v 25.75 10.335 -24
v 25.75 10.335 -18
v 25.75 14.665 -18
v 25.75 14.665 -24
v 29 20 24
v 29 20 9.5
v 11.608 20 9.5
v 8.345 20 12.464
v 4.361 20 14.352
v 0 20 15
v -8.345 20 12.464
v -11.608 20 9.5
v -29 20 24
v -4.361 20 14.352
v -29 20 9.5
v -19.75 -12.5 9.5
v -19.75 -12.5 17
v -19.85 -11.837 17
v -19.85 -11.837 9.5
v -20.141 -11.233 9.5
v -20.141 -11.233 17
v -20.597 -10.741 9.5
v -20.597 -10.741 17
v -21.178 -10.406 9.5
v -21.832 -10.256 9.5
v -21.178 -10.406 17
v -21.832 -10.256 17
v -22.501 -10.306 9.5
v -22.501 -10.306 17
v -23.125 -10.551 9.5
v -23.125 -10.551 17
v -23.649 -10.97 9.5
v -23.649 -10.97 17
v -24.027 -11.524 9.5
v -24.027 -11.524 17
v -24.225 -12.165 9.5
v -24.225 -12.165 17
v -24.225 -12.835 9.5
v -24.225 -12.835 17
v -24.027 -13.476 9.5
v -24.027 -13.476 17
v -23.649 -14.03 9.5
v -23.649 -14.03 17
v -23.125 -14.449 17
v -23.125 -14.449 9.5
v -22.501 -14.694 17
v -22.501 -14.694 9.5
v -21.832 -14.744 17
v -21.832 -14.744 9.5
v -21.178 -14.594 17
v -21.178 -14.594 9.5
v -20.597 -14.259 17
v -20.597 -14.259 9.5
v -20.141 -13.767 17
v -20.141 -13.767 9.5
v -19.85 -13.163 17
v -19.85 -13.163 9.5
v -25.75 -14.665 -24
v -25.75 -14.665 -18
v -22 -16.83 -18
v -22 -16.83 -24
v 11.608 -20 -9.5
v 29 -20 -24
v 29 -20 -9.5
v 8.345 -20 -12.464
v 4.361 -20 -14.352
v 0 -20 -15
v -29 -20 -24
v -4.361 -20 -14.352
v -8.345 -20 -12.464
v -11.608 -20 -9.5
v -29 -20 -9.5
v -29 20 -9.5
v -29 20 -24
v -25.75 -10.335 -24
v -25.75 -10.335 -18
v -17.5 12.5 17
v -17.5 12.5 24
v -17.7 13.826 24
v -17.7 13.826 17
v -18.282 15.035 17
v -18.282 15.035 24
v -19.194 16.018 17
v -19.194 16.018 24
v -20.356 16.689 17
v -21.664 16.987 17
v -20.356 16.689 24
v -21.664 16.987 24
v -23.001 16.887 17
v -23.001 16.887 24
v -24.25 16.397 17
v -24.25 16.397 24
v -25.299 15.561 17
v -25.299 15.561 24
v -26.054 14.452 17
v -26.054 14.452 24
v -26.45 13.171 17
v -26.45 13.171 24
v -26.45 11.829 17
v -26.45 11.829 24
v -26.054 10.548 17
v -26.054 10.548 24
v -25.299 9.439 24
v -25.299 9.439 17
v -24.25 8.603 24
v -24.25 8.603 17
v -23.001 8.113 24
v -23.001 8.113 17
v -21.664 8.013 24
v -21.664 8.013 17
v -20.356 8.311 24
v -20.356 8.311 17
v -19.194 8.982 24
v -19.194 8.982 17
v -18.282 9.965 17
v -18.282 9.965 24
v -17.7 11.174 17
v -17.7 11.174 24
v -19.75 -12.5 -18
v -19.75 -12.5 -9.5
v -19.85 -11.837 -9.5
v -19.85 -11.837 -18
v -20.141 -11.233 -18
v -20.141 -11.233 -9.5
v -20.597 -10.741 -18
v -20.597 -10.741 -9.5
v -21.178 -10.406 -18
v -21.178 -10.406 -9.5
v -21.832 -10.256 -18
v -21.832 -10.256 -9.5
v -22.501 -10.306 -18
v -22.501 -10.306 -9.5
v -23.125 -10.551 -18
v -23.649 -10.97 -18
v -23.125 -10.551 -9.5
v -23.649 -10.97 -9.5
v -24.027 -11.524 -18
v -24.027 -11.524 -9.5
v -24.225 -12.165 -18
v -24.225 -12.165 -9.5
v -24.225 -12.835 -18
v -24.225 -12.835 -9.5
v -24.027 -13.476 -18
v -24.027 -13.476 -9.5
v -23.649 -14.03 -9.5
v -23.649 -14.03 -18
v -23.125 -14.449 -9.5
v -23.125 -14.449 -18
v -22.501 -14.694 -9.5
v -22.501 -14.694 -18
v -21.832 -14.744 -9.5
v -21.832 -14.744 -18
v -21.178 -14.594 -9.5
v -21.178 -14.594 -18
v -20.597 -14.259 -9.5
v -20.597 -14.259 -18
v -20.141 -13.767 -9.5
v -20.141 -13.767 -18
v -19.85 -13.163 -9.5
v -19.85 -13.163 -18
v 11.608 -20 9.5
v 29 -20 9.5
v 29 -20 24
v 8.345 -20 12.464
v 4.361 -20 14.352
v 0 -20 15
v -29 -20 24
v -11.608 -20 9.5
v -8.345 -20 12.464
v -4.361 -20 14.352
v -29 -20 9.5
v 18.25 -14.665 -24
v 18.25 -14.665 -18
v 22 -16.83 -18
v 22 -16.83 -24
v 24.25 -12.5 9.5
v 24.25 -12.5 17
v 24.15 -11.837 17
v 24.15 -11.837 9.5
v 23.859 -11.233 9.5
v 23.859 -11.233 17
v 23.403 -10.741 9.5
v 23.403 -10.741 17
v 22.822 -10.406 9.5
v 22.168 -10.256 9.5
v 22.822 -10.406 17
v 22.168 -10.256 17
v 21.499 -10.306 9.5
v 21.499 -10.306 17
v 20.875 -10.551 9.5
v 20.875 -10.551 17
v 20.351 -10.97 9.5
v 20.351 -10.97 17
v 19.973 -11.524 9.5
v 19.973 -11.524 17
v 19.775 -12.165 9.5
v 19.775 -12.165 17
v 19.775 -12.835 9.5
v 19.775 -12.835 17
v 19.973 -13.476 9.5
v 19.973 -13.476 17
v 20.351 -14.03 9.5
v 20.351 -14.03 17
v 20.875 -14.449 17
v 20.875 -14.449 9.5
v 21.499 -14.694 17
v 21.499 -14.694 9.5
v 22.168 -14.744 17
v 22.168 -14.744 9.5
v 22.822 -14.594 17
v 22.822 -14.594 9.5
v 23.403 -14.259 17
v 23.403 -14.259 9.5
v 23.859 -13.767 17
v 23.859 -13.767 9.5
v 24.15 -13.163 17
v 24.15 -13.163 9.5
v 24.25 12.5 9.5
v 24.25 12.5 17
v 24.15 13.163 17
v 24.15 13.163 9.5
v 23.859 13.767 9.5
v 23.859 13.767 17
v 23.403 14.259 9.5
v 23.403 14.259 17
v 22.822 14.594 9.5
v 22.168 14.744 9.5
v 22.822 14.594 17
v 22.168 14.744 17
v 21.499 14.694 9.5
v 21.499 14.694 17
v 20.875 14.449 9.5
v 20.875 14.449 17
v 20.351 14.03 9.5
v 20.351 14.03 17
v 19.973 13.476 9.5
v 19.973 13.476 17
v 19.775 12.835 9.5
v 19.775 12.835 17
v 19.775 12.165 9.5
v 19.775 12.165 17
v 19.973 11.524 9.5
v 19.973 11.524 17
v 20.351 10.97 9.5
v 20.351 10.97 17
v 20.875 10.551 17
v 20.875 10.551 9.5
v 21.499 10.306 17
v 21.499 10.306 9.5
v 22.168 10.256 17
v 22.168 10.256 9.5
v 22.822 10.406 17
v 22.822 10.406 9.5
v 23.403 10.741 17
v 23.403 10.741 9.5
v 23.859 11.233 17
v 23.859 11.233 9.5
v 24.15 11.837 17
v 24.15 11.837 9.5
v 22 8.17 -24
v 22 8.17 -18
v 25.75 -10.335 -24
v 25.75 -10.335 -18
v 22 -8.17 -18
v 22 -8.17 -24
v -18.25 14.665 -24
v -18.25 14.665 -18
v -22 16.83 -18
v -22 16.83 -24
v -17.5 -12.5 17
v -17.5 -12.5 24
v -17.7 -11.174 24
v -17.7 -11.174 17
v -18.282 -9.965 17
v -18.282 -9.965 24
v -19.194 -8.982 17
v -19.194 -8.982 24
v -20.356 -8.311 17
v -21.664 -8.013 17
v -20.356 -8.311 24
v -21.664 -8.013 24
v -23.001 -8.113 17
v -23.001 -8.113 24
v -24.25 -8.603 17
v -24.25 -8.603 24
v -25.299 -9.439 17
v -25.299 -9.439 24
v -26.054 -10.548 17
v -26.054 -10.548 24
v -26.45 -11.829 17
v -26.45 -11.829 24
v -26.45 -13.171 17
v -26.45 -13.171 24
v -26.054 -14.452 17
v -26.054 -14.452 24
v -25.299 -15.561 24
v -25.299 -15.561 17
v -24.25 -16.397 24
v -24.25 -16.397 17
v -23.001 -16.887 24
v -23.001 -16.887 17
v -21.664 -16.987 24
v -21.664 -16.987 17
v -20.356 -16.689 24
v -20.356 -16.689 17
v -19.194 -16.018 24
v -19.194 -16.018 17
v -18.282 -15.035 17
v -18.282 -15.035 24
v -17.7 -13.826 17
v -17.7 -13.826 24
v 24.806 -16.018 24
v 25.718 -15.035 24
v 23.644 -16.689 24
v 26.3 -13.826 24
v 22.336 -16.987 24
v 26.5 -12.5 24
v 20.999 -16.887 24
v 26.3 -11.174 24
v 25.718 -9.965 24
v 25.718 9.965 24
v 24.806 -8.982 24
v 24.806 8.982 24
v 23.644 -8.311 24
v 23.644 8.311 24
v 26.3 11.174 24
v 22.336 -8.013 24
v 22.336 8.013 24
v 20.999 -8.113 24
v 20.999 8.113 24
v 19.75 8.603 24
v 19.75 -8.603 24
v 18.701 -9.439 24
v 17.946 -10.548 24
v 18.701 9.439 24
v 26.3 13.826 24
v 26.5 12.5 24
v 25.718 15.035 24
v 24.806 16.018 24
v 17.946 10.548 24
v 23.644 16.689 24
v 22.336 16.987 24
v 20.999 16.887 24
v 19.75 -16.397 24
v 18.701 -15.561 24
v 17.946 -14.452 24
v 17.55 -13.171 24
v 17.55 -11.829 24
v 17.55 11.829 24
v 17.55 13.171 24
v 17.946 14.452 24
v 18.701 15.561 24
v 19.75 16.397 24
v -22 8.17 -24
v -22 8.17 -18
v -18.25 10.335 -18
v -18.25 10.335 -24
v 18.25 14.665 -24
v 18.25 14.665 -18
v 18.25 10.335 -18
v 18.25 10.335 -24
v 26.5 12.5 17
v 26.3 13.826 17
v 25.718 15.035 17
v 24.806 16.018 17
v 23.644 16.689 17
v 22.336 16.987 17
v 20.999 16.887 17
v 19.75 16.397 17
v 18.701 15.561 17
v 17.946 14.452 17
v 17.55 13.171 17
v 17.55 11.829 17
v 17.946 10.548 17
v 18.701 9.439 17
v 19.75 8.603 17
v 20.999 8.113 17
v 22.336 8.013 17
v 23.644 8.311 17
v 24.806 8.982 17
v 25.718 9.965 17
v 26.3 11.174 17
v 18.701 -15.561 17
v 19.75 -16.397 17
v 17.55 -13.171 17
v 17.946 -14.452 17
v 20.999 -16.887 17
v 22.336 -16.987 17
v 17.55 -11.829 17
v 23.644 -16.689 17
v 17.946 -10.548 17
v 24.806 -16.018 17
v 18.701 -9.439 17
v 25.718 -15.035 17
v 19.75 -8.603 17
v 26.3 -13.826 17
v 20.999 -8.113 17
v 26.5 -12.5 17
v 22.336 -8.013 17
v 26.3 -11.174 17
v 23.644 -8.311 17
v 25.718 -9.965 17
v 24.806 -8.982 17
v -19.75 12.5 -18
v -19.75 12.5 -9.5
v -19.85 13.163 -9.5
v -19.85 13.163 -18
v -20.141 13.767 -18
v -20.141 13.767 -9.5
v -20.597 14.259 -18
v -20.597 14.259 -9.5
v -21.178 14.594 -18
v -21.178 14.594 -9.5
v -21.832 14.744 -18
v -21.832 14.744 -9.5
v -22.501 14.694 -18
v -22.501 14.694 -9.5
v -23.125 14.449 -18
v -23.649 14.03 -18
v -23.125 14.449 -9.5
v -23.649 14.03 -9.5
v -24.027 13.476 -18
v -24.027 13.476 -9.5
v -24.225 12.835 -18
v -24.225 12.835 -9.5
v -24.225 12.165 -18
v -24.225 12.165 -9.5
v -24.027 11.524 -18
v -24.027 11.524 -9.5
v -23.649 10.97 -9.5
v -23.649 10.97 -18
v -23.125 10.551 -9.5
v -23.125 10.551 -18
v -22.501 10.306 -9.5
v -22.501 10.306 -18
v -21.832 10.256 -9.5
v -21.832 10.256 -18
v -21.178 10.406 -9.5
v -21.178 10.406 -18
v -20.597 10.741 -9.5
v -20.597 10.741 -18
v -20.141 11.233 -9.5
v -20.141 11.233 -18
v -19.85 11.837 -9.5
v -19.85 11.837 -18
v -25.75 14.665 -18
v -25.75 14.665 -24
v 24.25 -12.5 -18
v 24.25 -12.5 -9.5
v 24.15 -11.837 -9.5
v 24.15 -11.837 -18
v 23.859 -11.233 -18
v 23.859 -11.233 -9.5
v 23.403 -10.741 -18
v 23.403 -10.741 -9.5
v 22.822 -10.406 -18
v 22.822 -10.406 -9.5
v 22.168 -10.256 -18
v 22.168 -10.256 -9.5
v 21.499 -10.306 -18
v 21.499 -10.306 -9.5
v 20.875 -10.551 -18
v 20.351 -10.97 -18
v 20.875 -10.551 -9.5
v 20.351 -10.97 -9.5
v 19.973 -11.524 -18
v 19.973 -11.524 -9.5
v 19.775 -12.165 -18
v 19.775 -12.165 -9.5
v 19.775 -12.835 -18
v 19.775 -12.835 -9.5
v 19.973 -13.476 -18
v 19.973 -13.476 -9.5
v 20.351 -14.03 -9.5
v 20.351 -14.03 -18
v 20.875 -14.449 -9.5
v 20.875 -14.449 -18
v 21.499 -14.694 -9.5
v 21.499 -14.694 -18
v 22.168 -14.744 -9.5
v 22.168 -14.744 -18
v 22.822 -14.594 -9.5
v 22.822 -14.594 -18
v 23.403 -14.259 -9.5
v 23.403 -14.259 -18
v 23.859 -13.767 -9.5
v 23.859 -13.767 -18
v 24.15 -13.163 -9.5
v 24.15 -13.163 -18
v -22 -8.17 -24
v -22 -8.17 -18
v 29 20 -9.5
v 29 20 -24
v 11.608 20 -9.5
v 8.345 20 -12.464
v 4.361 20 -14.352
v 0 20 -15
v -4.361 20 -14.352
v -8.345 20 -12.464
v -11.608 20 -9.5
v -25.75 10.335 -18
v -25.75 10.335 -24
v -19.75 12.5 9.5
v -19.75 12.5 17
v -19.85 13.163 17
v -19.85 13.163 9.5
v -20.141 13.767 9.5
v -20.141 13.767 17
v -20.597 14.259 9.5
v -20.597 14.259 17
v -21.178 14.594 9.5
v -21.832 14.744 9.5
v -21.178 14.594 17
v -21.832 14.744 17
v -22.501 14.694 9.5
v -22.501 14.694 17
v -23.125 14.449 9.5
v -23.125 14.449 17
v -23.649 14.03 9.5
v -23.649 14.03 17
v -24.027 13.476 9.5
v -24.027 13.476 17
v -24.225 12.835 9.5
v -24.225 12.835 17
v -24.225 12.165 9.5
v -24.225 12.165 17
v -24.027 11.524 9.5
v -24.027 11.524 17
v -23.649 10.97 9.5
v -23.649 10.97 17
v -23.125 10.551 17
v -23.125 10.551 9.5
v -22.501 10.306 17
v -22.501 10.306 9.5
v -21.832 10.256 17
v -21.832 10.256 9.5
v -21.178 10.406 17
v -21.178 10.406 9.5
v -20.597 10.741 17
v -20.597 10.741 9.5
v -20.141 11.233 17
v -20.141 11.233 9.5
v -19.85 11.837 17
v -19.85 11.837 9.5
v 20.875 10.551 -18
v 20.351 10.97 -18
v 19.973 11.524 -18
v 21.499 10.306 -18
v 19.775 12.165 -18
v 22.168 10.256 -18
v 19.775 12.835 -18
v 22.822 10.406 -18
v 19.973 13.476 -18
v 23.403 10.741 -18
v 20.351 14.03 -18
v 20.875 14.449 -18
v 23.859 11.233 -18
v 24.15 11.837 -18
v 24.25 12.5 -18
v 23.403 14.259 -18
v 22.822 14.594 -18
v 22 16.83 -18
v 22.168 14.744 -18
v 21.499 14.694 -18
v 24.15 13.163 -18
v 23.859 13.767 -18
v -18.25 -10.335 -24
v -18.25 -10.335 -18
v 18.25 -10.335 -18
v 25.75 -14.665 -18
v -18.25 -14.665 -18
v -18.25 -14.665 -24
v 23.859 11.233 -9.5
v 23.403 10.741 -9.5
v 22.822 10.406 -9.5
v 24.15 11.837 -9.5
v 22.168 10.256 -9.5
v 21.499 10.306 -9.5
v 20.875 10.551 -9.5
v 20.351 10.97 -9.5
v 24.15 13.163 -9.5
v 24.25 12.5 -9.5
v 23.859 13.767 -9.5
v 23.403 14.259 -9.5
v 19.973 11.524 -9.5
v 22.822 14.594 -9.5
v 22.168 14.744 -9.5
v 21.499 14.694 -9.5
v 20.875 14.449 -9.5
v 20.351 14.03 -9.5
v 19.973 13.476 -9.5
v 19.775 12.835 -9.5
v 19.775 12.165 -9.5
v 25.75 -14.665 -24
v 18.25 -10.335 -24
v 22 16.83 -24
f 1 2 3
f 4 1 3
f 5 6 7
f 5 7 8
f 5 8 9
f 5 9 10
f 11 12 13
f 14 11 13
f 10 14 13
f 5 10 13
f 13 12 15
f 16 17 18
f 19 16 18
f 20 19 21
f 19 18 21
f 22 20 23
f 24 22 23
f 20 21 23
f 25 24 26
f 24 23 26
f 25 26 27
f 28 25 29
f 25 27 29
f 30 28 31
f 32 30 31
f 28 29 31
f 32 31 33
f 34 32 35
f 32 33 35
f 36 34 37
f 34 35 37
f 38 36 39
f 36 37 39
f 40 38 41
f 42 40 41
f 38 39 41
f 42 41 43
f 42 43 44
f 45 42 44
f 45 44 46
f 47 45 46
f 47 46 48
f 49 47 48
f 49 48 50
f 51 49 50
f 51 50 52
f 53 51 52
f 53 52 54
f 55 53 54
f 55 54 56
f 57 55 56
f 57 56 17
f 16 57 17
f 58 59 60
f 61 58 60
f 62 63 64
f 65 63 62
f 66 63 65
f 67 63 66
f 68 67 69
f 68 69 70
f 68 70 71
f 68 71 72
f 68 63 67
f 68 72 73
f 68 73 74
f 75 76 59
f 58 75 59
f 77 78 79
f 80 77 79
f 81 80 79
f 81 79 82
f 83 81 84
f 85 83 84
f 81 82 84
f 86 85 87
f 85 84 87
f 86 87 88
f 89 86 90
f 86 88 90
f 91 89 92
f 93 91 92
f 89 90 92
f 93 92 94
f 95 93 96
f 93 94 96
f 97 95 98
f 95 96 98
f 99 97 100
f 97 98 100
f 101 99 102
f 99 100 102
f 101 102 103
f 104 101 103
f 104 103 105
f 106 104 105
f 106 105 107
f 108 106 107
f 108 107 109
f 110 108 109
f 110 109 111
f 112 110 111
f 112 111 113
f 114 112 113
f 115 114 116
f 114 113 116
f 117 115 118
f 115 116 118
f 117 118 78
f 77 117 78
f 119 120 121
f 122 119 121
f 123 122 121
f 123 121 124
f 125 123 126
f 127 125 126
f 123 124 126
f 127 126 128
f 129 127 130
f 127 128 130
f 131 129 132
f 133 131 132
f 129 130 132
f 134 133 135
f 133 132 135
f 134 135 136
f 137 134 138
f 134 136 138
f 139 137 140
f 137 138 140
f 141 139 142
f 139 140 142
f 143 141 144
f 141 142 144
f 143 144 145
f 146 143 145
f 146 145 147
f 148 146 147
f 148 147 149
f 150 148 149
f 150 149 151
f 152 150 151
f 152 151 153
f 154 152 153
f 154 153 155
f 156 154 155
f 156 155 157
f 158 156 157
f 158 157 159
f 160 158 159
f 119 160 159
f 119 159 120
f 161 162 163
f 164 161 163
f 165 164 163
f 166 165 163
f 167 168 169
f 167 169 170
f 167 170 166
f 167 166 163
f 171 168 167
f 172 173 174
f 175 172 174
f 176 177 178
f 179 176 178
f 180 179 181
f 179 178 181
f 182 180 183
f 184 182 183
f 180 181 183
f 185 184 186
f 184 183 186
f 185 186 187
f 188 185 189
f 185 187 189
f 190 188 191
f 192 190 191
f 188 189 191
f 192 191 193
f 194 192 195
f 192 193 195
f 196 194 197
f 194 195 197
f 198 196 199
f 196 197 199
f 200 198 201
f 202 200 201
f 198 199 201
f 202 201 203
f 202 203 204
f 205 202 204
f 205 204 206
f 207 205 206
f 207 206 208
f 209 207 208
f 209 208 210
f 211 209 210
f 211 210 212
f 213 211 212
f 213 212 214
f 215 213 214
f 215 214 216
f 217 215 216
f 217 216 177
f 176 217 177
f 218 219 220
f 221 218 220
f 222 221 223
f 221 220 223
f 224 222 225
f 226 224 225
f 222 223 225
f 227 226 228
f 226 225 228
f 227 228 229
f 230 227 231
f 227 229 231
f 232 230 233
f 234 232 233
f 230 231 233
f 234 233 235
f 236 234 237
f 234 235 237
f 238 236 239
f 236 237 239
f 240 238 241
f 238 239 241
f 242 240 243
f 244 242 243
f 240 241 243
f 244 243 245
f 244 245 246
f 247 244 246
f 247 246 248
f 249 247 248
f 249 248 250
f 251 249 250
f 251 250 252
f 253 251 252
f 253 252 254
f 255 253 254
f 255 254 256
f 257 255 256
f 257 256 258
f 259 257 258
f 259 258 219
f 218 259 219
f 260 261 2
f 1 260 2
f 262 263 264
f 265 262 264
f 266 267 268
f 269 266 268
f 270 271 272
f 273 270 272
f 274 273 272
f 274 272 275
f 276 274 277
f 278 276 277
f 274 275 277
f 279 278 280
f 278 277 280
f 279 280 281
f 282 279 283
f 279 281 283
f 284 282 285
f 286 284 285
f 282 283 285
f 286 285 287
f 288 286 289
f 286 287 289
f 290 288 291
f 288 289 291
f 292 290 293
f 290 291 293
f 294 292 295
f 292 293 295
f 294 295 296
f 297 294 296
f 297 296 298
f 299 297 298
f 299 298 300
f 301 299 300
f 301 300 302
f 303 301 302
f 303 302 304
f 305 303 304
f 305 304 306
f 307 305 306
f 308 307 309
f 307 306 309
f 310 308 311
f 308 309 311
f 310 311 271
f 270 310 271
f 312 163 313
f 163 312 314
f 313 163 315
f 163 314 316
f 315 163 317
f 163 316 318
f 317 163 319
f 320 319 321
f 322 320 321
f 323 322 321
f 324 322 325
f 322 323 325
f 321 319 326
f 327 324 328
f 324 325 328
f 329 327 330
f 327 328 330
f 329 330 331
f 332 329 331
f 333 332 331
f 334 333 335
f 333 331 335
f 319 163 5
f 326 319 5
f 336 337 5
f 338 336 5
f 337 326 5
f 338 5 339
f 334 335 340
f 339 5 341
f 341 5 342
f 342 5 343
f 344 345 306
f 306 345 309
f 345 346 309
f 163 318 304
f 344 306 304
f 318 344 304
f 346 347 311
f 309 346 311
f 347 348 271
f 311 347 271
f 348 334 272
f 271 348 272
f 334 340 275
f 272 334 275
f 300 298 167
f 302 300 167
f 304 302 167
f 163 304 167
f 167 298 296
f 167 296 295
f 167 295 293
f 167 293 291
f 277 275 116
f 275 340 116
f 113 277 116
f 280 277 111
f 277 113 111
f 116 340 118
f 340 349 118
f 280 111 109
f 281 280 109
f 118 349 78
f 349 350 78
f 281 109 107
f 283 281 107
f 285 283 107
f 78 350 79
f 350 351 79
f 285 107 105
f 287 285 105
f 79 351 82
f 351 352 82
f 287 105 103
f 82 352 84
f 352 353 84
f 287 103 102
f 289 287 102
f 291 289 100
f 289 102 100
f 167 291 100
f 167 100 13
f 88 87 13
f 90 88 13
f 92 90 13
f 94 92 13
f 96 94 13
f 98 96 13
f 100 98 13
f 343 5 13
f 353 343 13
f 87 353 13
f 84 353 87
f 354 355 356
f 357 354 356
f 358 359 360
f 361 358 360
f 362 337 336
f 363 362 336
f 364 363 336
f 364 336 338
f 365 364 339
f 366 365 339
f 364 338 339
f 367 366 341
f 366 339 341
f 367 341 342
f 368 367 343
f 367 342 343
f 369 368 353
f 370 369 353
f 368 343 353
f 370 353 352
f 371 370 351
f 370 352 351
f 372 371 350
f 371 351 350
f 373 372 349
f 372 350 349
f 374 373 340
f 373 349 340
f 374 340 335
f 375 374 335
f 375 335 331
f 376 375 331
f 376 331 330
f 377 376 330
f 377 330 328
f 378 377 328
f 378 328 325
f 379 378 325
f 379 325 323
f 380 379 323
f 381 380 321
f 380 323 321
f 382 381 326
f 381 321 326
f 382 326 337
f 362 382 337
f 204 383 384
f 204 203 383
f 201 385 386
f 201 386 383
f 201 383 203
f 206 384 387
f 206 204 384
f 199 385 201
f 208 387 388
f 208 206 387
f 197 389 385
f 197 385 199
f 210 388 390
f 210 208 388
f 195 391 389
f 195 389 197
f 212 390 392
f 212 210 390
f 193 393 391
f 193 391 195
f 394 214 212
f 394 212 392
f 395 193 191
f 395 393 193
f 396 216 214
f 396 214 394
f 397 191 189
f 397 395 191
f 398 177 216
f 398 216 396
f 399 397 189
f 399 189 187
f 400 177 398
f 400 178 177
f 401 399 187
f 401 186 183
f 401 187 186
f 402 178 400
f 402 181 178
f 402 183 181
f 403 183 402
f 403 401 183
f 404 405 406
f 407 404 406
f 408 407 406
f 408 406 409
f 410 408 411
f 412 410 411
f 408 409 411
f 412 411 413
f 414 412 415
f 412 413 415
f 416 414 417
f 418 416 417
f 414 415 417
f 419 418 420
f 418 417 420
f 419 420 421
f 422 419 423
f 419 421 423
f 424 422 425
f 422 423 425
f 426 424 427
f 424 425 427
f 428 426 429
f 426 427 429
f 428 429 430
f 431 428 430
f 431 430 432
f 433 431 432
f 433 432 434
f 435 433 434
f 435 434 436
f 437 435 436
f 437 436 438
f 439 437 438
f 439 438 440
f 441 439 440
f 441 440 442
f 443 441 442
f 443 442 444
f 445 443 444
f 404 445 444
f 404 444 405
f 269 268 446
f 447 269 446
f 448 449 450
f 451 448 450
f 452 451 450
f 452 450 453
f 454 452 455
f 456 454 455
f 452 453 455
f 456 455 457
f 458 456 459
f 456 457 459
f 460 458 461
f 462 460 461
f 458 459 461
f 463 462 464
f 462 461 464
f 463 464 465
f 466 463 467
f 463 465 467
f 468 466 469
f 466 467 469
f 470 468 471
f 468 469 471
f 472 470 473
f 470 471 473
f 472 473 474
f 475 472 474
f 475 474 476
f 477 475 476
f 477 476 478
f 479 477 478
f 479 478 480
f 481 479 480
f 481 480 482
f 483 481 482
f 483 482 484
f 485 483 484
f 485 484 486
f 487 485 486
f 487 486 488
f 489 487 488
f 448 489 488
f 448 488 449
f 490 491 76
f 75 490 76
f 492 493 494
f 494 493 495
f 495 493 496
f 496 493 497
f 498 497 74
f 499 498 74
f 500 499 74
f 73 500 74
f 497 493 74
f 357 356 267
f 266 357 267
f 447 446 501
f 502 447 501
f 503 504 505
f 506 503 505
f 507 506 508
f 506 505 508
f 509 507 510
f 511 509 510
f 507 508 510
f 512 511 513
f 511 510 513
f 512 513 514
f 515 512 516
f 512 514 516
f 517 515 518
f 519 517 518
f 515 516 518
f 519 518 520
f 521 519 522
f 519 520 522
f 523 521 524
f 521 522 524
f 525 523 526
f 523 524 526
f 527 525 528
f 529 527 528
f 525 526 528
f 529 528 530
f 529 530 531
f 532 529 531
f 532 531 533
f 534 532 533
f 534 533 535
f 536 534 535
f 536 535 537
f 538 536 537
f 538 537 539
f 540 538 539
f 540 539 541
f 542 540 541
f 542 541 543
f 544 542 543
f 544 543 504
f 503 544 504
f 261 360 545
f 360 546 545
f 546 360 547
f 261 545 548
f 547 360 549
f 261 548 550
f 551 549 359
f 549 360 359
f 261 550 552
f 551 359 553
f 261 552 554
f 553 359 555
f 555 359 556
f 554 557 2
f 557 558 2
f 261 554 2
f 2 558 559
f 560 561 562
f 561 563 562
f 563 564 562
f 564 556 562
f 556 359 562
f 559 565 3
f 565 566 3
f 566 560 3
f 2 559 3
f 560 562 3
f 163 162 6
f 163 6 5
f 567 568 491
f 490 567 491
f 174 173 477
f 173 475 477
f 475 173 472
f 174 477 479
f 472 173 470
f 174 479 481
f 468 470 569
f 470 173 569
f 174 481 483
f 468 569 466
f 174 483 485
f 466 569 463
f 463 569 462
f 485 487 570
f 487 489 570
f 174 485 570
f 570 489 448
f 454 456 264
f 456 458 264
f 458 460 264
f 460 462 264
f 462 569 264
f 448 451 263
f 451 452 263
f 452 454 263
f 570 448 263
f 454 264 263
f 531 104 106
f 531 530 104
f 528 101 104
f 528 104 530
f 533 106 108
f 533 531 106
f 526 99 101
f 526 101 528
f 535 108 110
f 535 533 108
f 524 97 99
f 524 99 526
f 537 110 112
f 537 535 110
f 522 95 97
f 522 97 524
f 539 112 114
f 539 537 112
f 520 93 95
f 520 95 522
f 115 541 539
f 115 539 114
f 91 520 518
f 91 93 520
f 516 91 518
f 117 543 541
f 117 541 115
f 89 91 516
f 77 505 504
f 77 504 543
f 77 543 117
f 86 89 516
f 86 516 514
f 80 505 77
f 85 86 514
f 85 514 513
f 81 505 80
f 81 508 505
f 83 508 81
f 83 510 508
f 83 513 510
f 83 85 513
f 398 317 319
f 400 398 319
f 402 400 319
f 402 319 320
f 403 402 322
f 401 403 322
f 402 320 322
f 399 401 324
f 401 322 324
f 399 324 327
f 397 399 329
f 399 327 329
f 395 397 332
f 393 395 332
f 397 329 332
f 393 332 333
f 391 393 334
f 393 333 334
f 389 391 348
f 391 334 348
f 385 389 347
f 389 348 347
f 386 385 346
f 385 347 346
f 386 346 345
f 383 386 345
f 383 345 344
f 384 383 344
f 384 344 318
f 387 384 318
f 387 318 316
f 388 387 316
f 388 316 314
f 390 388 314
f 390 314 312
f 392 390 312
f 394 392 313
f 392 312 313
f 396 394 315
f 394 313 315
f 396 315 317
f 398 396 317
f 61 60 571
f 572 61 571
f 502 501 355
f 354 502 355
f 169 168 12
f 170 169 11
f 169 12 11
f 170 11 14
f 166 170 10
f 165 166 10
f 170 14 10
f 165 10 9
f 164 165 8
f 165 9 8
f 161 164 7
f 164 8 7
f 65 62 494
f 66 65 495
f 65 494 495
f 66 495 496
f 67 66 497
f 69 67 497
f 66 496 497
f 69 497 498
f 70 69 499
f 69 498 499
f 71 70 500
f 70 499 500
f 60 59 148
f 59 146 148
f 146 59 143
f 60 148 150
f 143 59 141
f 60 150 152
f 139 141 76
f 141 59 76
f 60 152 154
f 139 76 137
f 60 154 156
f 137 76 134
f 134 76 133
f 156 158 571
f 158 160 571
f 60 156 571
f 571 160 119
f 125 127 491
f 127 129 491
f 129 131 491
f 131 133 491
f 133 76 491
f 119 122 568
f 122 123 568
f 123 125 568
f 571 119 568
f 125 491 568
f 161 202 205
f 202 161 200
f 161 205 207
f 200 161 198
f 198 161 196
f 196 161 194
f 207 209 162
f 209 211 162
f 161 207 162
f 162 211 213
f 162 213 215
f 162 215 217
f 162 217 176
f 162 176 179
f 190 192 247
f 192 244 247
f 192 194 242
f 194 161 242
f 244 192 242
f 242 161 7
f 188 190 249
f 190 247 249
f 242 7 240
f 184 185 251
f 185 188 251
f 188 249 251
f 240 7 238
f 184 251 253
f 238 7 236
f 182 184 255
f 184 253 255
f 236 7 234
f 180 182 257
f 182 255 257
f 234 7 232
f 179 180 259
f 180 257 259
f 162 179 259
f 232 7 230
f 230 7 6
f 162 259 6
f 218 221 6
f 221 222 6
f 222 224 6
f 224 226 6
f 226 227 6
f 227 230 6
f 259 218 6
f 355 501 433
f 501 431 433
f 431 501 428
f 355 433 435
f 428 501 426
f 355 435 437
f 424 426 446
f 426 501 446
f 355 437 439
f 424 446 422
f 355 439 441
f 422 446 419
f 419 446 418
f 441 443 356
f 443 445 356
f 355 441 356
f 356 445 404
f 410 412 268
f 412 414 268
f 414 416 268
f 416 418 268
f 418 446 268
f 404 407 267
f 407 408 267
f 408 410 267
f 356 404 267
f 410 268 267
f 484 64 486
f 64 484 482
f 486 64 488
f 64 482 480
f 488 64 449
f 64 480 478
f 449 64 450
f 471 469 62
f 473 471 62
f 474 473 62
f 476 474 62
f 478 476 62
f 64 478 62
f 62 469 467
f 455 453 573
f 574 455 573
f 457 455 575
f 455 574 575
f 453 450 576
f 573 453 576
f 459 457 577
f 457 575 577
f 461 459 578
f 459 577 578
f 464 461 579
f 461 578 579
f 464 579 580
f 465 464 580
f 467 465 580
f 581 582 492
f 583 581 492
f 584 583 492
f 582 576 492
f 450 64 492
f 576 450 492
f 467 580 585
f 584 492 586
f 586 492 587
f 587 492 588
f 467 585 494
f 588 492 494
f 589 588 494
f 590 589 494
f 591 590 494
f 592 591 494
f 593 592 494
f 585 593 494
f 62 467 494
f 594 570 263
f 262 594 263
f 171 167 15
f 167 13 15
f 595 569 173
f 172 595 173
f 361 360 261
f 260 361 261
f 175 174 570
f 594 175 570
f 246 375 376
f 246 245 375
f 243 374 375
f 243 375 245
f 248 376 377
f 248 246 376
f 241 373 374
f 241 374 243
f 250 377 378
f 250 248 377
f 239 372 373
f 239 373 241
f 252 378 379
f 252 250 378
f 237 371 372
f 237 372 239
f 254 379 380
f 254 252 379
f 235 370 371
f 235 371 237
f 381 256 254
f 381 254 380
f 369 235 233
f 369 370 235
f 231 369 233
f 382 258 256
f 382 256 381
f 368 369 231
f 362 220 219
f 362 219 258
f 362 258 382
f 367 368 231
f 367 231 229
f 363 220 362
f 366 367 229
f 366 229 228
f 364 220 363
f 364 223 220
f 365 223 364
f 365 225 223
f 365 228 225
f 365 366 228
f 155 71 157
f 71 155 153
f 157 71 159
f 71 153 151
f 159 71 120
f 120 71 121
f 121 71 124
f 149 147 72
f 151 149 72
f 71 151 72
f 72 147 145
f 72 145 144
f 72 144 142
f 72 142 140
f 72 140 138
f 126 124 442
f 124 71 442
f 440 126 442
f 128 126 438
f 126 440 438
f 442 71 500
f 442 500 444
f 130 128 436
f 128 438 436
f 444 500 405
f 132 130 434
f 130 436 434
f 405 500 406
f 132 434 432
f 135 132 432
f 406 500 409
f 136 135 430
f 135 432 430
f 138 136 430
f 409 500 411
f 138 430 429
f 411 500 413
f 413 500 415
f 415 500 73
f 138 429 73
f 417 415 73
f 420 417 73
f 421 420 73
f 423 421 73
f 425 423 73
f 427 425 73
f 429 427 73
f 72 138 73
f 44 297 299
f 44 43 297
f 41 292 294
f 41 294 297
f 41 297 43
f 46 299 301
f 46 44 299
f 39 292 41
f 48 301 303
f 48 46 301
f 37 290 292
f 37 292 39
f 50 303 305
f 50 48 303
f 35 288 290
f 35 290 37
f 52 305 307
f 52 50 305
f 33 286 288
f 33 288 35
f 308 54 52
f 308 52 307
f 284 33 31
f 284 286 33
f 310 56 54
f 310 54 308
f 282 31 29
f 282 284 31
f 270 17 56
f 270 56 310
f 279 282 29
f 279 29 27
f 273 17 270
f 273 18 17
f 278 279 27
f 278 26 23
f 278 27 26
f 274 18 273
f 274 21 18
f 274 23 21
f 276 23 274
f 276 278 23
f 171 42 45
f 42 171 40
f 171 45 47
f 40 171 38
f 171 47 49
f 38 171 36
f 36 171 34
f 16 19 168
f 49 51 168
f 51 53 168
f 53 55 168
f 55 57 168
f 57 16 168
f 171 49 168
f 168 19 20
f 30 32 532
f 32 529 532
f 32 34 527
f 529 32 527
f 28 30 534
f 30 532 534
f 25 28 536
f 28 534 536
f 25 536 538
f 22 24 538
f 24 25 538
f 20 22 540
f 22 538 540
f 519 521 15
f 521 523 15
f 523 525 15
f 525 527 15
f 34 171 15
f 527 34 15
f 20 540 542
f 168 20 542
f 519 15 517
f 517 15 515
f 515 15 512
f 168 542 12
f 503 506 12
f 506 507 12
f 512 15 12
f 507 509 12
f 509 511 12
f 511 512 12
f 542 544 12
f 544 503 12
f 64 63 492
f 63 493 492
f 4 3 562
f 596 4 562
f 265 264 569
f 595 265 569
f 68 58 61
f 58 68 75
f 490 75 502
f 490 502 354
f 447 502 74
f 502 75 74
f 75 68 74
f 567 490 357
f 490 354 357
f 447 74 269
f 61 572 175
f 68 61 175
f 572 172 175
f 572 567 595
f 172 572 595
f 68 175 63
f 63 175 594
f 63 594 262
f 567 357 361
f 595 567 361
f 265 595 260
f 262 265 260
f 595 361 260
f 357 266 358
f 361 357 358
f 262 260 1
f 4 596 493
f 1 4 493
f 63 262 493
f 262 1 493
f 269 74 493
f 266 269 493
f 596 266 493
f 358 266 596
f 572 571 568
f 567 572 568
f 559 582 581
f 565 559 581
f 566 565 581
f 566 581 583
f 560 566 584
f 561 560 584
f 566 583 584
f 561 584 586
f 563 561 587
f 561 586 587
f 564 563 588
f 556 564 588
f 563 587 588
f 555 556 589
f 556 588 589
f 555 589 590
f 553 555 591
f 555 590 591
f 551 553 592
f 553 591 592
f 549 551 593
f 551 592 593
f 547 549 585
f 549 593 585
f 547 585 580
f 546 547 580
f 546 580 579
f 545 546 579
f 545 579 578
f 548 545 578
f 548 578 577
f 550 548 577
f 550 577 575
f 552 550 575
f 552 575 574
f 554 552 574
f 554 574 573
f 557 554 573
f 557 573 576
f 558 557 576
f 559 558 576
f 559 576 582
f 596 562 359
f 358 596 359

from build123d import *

# Parameters (mm, degrees)
BOSS_EXTRUDE1_DEPTH   = 20
BOSS_EXTRUDE1_2_DEPTH = 20
SKETCH2_R             = 2.25
CUT_EXTRUDE1_DEPTH    = 60.539902586
SKETCH3_R             = 4.5
CUT_EXTRUDE2_DEPTH    = 7
CUT_EXTRUDE3_START    = -35
CUT_EXTRUDE3_DEPTH    = 20.055527007


with BuildPart() as part:
    # Sketch1 → Boss-Extrude1 (new, symmetric)
    with BuildSketch(Plane(origin=(0, 0, 0), x_dir=(1, 0, 0), z_dir=(0, 1, 0))):
        with BuildLine():
            Line((29, -9.5), (29, -24))
            Line((29, -24), (-29, -24))
            Line((-29, -24), (-29, -9.5))
            Line((-29, -9.5), (-11.608186766, -9.5))
            ThreePointArc((-11.608186766, -9.5), (0, -15), (11.608186766, -9.5))
            Line((11.608186766, -9.5), (29, -9.5))
        make_face()
    extrude(amount=BOSS_EXTRUDE1_DEPTH, both=True)


with BuildPart() as body_2:
    # Sketch1 → Boss-Extrude1 2 (new, symmetric)
    with BuildSketch(Plane(origin=(0, 0, 0), x_dir=(1, 0, 0), z_dir=(0, 1, 0))):
        with BuildLine():
            Line((-29, 24), (29, 24))
            Line((29, 24), (29, 9.5))
            Line((29, 9.5), (11.608186766, 9.5))
            ThreePointArc((11.608186766, 9.5), (0, 15), (-11.608186766, 9.5))
            Line((-11.608186766, 9.5), (-29, 9.5))
            Line((-29, 9.5), (-29, 24))
        make_face()
    extrude(amount=BOSS_EXTRUDE1_2_DEPTH, both=True)


with BuildPart() as cut_extrude1_tool:
    # Sketch2 → Cut-Extrude1 (new, through all)
    with BuildSketch(Plane.XY.offset(24)):
        with Locations((22, 12.5)):
            Circle(SKETCH2_R)
        with Locations((22, -12.5)):
            Circle(SKETCH2_R)
        with Locations((-22, -12.5)):
            Circle(SKETCH2_R)
        with Locations((-22, 12.5)):
            Circle(SKETCH2_R)
    extrude(amount=-CUT_EXTRUDE1_DEPTH)


with BuildPart() as part_1:
    add(part.part)

    # Cut-Extrude1: cut by cut_extrude1_tool
    add(cut_extrude1_tool.part, mode=Mode.SUBTRACT)

    # Sketch3 → Cut-Extrude2 (cut)
    with BuildSketch(Plane.XY.offset(24)):
        with Locations((22, 12.5)):
            Circle(SKETCH3_R)
        with Locations((22, -12.5)):
            Circle(SKETCH3_R)
        with Locations((-22, -12.5)):
            Circle(SKETCH3_R)
        with Locations((-22, 12.5)):
            Circle(SKETCH3_R)
    extrude(amount=-CUT_EXTRUDE2_DEPTH, mode=Mode.SUBTRACT)


with BuildPart() as body_2_1:
    add(body_2.part)

    # Cut-Extrude1: cut by cut_extrude1_tool
    add(cut_extrude1_tool.part, mode=Mode.SUBTRACT)

    # Sketch4 → Cut-Extrude3 (cut, through all)
    with BuildSketch(Plane.XY.offset(17).offset(CUT_EXTRUDE3_START)):
        Polygon((22, 8.169872981), (25.75, 10.334936491), (25.75, 14.665063509), (22, 16.830127019), (18.25, 14.665063509), (18.25, 10.334936491), align=None)
        Polygon((22, -16.830127019), (25.75, -14.665063509), (25.75, -10.334936491), (22, -8.169872981), (18.25, -10.334936491), (18.25, -14.665063509), align=None)
        Polygon((-22, -16.830127019), (-18.25, -14.665063509), (-18.25, -10.334936491), (-22, -8.169872981), (-25.75, -10.334936491), (-25.75, -14.665063509), align=None)
        Polygon((-22, 8.169872981), (-18.25, 10.334936491), (-18.25, 14.665063509), (-22, 16.830127019), (-25.75, 14.665063509), (-25.75, 10.334936491), align=None)
    extrude(amount=-CUT_EXTRUDE3_DEPTH, mode=Mode.SUBTRACT)


solid = Compound([part_1.part, body_2_1.part])
